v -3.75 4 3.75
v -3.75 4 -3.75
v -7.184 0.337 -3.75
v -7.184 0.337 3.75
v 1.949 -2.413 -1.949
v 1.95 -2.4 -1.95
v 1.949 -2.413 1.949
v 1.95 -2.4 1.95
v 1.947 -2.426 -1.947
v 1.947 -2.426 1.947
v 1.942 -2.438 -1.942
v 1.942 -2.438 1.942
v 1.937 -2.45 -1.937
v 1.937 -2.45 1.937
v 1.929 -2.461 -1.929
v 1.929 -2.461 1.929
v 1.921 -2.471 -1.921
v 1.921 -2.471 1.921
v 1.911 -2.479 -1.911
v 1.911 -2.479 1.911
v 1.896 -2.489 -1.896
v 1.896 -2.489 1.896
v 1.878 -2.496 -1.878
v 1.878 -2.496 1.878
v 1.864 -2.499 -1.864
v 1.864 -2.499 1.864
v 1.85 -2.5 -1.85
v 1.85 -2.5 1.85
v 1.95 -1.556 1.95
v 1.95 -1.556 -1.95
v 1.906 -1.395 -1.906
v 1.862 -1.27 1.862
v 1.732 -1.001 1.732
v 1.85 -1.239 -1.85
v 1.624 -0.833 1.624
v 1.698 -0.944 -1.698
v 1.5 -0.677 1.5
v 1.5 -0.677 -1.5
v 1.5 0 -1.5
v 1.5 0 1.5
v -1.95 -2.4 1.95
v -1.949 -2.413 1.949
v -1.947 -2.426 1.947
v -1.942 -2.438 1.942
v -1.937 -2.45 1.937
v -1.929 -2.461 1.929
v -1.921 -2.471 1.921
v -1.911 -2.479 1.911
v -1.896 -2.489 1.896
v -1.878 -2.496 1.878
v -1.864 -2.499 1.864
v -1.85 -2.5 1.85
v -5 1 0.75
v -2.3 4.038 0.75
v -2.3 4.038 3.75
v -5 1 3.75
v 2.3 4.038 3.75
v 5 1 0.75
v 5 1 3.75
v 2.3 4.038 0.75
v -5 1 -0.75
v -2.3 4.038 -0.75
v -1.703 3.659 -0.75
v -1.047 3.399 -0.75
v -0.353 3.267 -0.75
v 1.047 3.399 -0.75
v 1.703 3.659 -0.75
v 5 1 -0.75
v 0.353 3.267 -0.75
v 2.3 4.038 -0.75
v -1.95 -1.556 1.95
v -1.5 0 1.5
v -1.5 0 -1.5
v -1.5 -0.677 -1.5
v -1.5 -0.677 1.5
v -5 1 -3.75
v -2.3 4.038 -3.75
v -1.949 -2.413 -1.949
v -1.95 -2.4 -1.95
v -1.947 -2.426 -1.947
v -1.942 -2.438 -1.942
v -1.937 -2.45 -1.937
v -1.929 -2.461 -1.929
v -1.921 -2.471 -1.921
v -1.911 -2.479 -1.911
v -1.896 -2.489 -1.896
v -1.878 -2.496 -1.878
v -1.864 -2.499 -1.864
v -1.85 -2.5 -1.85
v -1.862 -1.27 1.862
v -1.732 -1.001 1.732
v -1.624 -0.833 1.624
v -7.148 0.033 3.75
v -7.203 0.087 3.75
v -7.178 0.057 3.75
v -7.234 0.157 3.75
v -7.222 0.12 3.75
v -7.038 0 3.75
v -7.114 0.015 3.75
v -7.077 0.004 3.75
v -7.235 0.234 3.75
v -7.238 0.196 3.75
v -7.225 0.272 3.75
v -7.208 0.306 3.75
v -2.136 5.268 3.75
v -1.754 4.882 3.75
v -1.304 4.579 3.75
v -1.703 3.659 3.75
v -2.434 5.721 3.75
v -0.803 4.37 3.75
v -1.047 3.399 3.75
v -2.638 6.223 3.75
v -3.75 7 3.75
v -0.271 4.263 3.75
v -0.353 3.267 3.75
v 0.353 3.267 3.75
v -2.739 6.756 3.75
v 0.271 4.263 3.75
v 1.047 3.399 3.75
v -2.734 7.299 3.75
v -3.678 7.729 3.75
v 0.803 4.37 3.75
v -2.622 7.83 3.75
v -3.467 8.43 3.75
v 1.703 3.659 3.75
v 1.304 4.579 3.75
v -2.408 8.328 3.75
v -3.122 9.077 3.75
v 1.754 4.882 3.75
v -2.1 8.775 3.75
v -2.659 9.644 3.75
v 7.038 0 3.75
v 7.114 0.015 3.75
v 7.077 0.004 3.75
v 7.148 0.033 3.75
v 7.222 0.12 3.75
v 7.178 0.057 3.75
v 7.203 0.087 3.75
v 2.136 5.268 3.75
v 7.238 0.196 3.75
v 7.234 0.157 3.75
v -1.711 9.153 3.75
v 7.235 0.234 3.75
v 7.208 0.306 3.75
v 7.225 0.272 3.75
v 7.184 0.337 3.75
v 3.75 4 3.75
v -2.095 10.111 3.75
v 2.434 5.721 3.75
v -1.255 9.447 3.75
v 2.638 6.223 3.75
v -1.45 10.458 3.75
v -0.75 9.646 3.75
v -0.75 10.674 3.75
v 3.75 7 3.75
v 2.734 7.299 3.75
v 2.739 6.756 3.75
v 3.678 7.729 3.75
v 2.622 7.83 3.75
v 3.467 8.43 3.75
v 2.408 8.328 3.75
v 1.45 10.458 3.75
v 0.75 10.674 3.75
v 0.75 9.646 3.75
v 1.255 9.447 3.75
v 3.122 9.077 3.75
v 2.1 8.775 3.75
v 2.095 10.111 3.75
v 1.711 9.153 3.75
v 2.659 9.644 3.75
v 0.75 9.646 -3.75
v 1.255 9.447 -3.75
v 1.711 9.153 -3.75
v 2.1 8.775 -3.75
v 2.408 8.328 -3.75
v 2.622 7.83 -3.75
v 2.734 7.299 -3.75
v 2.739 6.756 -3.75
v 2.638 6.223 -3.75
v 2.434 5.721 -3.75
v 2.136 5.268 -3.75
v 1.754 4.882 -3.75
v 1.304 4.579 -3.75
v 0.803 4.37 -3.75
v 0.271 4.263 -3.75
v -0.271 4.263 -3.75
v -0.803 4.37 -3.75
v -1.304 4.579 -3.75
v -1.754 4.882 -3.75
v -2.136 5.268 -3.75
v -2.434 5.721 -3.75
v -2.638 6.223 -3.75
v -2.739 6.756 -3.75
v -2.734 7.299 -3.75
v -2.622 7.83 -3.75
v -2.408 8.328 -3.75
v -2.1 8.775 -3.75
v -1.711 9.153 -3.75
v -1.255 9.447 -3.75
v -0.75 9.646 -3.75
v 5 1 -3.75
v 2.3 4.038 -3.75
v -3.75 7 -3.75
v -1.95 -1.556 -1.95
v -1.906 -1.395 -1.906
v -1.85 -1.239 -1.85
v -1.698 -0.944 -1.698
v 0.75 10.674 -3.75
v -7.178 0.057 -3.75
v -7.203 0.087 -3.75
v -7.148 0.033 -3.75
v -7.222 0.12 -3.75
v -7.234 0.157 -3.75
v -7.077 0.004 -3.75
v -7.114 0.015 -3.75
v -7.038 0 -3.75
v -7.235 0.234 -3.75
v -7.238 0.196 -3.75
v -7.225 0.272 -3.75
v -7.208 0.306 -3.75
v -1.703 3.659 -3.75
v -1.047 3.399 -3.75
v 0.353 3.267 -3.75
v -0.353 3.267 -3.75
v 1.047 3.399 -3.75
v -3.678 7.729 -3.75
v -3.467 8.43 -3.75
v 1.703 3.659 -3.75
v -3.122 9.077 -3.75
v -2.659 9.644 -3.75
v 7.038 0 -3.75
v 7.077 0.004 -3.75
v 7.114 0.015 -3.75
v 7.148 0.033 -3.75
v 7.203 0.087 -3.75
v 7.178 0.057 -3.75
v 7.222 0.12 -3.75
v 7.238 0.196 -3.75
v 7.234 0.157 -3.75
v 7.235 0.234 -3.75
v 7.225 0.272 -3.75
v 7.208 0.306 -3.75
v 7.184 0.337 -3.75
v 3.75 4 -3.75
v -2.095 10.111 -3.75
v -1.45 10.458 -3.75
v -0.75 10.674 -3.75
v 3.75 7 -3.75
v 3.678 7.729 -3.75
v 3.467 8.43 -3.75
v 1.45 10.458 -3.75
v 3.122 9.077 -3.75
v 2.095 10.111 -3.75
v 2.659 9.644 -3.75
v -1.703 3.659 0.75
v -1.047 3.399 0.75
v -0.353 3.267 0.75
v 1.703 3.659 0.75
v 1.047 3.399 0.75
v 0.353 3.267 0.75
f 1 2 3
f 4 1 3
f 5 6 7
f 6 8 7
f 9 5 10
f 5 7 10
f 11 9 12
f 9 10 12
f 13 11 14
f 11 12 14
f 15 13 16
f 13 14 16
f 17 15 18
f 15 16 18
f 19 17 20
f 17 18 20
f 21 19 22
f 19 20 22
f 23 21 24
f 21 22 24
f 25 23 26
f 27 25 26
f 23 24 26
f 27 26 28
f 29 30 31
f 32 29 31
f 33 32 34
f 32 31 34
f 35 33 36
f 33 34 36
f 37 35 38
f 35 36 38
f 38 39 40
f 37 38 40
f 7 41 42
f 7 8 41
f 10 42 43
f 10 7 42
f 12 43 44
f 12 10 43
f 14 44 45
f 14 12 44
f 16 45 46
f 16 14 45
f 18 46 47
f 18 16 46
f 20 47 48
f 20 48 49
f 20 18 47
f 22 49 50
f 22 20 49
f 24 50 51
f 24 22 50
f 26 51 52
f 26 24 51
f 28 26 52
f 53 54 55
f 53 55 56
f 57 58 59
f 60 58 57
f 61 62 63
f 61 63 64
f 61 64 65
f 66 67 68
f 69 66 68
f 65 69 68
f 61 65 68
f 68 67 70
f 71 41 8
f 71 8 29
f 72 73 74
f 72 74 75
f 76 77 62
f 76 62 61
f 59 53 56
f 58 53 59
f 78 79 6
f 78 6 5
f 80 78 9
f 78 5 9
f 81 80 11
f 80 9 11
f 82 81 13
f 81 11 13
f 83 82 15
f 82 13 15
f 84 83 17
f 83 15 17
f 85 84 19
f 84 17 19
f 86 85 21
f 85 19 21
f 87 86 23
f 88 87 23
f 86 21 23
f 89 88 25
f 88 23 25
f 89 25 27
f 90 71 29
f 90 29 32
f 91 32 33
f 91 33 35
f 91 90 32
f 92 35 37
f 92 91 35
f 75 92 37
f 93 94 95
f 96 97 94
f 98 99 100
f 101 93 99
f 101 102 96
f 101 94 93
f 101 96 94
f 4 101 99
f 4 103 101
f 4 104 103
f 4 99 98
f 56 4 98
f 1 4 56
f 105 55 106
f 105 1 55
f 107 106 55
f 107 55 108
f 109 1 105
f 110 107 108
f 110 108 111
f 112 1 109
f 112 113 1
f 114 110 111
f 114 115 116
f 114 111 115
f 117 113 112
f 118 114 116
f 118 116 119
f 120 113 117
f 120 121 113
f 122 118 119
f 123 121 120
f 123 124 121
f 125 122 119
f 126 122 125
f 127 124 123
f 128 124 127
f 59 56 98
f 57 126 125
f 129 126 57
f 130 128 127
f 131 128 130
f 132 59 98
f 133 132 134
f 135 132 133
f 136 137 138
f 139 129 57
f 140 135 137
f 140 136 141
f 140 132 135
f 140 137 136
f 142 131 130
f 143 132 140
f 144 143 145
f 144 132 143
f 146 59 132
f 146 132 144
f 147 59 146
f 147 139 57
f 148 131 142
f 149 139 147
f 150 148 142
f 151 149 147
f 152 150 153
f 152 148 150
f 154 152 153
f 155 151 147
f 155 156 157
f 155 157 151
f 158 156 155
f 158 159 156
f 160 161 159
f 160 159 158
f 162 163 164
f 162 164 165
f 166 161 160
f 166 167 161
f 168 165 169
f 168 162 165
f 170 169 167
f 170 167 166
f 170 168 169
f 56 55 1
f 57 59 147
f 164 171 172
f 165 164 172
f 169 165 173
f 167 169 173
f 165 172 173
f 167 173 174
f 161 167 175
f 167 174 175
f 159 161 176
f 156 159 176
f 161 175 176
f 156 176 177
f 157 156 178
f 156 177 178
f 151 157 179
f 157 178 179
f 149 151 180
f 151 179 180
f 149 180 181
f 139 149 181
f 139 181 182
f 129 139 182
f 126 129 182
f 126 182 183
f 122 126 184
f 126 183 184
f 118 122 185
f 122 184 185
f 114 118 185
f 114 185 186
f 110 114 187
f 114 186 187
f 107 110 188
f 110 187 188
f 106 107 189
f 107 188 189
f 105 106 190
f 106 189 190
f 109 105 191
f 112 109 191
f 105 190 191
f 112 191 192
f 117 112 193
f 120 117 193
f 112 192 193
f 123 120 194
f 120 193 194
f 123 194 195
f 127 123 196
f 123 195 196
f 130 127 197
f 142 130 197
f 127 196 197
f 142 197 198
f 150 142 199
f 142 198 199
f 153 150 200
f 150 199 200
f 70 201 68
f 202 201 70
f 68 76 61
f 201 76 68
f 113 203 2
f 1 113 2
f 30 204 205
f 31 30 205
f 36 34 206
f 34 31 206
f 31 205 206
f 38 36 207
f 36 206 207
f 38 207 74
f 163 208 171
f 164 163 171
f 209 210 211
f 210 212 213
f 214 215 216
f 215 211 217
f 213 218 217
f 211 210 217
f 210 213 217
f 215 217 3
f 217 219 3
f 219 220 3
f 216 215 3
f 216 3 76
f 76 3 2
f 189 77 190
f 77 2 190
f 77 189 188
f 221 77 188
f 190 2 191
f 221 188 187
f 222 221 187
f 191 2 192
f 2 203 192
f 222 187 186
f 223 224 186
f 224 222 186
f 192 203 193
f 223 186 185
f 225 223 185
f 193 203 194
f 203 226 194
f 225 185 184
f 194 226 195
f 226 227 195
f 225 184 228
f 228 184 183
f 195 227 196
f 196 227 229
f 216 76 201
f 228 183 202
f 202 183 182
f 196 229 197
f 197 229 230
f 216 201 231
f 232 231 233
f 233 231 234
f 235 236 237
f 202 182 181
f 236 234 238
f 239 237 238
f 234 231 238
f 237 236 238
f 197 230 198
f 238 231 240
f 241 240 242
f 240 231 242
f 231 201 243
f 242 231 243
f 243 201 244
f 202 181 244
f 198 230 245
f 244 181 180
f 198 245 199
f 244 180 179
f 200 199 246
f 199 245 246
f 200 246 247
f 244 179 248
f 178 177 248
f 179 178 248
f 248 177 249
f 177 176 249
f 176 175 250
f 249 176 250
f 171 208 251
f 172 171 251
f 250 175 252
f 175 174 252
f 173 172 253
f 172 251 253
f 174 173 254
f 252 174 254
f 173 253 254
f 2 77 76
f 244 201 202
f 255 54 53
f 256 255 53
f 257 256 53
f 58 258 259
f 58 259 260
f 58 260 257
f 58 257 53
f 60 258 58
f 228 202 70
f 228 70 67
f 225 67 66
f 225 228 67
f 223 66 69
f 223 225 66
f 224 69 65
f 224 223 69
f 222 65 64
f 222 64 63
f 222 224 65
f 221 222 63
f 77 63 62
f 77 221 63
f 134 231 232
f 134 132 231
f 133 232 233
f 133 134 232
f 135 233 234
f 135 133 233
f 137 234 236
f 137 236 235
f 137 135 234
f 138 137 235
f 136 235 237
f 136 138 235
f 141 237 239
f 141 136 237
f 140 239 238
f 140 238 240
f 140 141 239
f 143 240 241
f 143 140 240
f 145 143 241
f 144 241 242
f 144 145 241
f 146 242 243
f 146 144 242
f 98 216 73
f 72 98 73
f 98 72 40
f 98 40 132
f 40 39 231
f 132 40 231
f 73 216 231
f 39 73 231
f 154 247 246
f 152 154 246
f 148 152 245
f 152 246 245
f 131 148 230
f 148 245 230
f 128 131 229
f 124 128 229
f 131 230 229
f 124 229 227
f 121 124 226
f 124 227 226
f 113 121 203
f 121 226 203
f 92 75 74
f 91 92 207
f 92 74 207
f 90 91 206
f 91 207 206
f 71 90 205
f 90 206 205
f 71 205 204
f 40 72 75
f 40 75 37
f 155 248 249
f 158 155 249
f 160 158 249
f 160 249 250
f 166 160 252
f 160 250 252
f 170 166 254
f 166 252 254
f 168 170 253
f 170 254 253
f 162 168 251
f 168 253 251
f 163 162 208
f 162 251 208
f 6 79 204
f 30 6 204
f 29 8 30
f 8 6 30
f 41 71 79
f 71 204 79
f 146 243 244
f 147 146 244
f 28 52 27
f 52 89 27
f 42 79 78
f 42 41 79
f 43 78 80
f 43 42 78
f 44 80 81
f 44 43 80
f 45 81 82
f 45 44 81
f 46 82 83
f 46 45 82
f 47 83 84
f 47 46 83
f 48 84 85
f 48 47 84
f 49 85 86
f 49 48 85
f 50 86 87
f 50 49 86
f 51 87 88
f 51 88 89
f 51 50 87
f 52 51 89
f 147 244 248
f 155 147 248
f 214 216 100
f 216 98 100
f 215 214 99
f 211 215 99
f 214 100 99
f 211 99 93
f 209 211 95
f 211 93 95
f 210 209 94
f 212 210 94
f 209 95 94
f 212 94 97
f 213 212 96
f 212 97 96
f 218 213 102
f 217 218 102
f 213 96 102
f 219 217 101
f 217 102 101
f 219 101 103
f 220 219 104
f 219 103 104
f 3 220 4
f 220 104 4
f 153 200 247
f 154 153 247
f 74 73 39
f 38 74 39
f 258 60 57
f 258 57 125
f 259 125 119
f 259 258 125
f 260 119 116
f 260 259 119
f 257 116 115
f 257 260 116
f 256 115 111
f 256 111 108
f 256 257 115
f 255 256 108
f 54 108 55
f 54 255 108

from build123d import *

# Parameters (mm, degrees)
EXTRUDE_1_DEPTH      = 3.75
EXTRUDE_1_DEPTH_BACK = 3.75
SKETCH_2_W           = 3
SKETCH_2_H           = 3
EXTRUDE_2_DEPTH      = 1
EXTRUDE_3_DEPTH      = 2
EXTRUDE_3_DEPTH_BACK = 2
CUT_EXTRUDE_1_REACH  = 16.741
CUT_EXTRUDE_START    = -3
CUT_EXTRUDE_2_DEPTH  = 3
CUT_EXTRUDE_START_2  = -7.5
CUT_EXTRUDE_3_DEPTH  = 3
FILLET_1_R           = 0.2
FILLET_2_R           = 0.1


with BuildPart() as part:
    # 草图1 → 凸台-拉伸1 (new, two sides: drawn at the far end of the back side and taken through both)
    with BuildSketch(Plane.XY.offset(-EXTRUDE_1_DEPTH_BACK)):
        with BuildLine():
            Line((-7.5, 0), (7.5, 0))
            Line((7.5, 0), (3.75, 4))
            Line((3.75, 4), (3.75, 7))
            ThreePointArc((3.75, 7), (2.90473751, 9.371708245), (0.75, 10.674234614))
            Line((0.75, 10.674234614), (0.75, 9.645751311))
            ThreePointArc((0.75, 9.645751311), (0, 4.25), (-0.75, 9.645751311))
            Line((-0.75, 9.645751311), (-0.75, 10.674234614))
            ThreePointArc((-0.75, 10.674234614), (-2.90473751, 9.371708245), (-3.75, 7))
            Line((-3.75, 7), (-3.75, 4))
            Line((-3.75, 4), (-7.5, 0))
        make_face()
    extrude(amount=EXTRUDE_1_DEPTH + EXTRUDE_1_DEPTH_BACK)

    # 草图2 → 凸台-拉伸2 (add)
    with BuildSketch(Plane.XZ):
        Rectangle(SKETCH_2_W, SKETCH_2_H)
    extrude(amount=EXTRUDE_2_DEPTH)

    # 草图3 → 凸台-拉伸3 (add, two sides: drawn at the far end of the back side and taken through both)
    with BuildSketch(Plane.XY.offset(-EXTRUDE_3_DEPTH_BACK)):
        with BuildLine():
            Line((-1.95, -2.5), (1.95, -2.5))
            Line((1.95, -2.5), (1.95, -1.555590279))
            ThreePointArc((1.95, -1.555590279), (1.780042303, -1.088161527), (1.5, -0.677124344))
            Line((1.5, -0.677124344), (-1.5, -0.677124344))
            ThreePointArc((-1.5, -0.677124344), (-1.780042303, -1.088161527), (-1.95, -1.555590279))
            Line((-1.95, -1.555590279), (-1.95, -2.5))
        make_face()
    extrude(amount=EXTRUDE_3_DEPTH + EXTRUDE_3_DEPTH_BACK)

    # 草图4 → 切除-拉伸1 (cut, up to next)
    with BuildSketch(Plane.ZY.offset(1.95), mode=Mode.PRIVATE) as cut_extrude_1_sk1:
        with BuildLine():
            Line((-1.95, -2.5), (-1.95, -1.555590279))
            ThreePointArc((-1.95, -1.555590279), (-1.780042303, -1.088161527), (-1.5, -0.677124344))
            Line((-1.5, -0.677124344), (-2, -0.677124344))
            Line((-2, -0.677124344), (-2, -2.5))
            Line((-2, -2.5), (-1.95, -2.5))
        make_face()
    cut_extrude_1_tool1 = extrude(cut_extrude_1_sk1.sketch, amount=-CUT_EXTRUDE_1_REACH, mode=Mode.PRIVATE) & part.part
    # 草图4 → 切除-拉伸1 (cut, up to next)
    with BuildSketch(Plane.ZY.offset(1.95), mode=Mode.PRIVATE) as cut_extrude_1_sk2:
        with BuildLine():
            Line((1.95, -2.5), (1.95, -1.555590279))
            ThreePointArc((1.95, -1.555590279), (1.780042303, -1.088161527), (1.5, -0.677124344))
            Line((1.5, -0.677124344), (2, -0.677124344))
            Line((2, -0.677124344), (2, -2.5))
            Line((2, -2.5), (1.95, -2.5))
        make_face()
    cut_extrude_1_tool2 = extrude(cut_extrude_1_sk2.sketch, amount=-CUT_EXTRUDE_1_REACH, mode=Mode.PRIVATE) & part.part
    add(cut_extrude_1_tool1.solids().sort_by_distance((-1.95, -1.175075, -1.873038))[0], mode=Mode.SUBTRACT)
    add(cut_extrude_1_tool2.solids().sort_by_distance((-1.95, -1.175075, 1.873038))[0], mode=Mode.SUBTRACT)

    # 草图5 → 切除-拉伸2 (cut)
    with BuildSketch(Plane.XY.offset(3.75).offset(CUT_EXTRUDE_START)):
        with BuildLine():
            Line((-5, 1), (5, 1))
            Line((5, 1), (2.299653235, 4.03789011))
            ThreePointArc((2.299653235, 4.03789011), (0, 3.25), (-2.299653235, 4.03789011))
            Line((-2.299653235, 4.03789011), (-5, 1))
        make_face()
    extrude(amount=CUT_EXTRUDE_2_DEPTH, mode=Mode.SUBTRACT)

    # 草图5<2> → 切除-拉伸3 (cut)
    with BuildSketch(Plane.XY.offset(3.75).offset(CUT_EXTRUDE_START_2)):
        with BuildLine():
            Line((-5, 1), (5, 1))
            Line((5, 1), (2.299653235, 4.03789011))
            ThreePointArc((2.299653235, 4.03789011), (0, 3.25), (-2.299653235, 4.03789011))
            Line((-2.299653235, 4.03789011), (-5, 1))
        make_face()
    extrude(amount=CUT_EXTRUDE_3_DEPTH, mode=Mode.SUBTRACT)

    # 圆角1
    fillet_1_edges = [part.edges().sort_by_distance(p)[0] for p in [
        (7.5, 0, 0),
        (-7.5, 0, 0),
    ]]
    fillet(fillet_1_edges, radius=FILLET_1_R)

    # 圆角2
    fillet_2_edges = [part.edges().sort_by_distance(p)[0] for p in [
        (0, -2.5, 1.95),
        (-1.95, -2.5, 0),
        (1.95, -2.5, 0),
        (0, -2.5, -1.95),
    ]]
    fillet(fillet_2_edges, radius=FILLET_2_R)


solid = part.part
